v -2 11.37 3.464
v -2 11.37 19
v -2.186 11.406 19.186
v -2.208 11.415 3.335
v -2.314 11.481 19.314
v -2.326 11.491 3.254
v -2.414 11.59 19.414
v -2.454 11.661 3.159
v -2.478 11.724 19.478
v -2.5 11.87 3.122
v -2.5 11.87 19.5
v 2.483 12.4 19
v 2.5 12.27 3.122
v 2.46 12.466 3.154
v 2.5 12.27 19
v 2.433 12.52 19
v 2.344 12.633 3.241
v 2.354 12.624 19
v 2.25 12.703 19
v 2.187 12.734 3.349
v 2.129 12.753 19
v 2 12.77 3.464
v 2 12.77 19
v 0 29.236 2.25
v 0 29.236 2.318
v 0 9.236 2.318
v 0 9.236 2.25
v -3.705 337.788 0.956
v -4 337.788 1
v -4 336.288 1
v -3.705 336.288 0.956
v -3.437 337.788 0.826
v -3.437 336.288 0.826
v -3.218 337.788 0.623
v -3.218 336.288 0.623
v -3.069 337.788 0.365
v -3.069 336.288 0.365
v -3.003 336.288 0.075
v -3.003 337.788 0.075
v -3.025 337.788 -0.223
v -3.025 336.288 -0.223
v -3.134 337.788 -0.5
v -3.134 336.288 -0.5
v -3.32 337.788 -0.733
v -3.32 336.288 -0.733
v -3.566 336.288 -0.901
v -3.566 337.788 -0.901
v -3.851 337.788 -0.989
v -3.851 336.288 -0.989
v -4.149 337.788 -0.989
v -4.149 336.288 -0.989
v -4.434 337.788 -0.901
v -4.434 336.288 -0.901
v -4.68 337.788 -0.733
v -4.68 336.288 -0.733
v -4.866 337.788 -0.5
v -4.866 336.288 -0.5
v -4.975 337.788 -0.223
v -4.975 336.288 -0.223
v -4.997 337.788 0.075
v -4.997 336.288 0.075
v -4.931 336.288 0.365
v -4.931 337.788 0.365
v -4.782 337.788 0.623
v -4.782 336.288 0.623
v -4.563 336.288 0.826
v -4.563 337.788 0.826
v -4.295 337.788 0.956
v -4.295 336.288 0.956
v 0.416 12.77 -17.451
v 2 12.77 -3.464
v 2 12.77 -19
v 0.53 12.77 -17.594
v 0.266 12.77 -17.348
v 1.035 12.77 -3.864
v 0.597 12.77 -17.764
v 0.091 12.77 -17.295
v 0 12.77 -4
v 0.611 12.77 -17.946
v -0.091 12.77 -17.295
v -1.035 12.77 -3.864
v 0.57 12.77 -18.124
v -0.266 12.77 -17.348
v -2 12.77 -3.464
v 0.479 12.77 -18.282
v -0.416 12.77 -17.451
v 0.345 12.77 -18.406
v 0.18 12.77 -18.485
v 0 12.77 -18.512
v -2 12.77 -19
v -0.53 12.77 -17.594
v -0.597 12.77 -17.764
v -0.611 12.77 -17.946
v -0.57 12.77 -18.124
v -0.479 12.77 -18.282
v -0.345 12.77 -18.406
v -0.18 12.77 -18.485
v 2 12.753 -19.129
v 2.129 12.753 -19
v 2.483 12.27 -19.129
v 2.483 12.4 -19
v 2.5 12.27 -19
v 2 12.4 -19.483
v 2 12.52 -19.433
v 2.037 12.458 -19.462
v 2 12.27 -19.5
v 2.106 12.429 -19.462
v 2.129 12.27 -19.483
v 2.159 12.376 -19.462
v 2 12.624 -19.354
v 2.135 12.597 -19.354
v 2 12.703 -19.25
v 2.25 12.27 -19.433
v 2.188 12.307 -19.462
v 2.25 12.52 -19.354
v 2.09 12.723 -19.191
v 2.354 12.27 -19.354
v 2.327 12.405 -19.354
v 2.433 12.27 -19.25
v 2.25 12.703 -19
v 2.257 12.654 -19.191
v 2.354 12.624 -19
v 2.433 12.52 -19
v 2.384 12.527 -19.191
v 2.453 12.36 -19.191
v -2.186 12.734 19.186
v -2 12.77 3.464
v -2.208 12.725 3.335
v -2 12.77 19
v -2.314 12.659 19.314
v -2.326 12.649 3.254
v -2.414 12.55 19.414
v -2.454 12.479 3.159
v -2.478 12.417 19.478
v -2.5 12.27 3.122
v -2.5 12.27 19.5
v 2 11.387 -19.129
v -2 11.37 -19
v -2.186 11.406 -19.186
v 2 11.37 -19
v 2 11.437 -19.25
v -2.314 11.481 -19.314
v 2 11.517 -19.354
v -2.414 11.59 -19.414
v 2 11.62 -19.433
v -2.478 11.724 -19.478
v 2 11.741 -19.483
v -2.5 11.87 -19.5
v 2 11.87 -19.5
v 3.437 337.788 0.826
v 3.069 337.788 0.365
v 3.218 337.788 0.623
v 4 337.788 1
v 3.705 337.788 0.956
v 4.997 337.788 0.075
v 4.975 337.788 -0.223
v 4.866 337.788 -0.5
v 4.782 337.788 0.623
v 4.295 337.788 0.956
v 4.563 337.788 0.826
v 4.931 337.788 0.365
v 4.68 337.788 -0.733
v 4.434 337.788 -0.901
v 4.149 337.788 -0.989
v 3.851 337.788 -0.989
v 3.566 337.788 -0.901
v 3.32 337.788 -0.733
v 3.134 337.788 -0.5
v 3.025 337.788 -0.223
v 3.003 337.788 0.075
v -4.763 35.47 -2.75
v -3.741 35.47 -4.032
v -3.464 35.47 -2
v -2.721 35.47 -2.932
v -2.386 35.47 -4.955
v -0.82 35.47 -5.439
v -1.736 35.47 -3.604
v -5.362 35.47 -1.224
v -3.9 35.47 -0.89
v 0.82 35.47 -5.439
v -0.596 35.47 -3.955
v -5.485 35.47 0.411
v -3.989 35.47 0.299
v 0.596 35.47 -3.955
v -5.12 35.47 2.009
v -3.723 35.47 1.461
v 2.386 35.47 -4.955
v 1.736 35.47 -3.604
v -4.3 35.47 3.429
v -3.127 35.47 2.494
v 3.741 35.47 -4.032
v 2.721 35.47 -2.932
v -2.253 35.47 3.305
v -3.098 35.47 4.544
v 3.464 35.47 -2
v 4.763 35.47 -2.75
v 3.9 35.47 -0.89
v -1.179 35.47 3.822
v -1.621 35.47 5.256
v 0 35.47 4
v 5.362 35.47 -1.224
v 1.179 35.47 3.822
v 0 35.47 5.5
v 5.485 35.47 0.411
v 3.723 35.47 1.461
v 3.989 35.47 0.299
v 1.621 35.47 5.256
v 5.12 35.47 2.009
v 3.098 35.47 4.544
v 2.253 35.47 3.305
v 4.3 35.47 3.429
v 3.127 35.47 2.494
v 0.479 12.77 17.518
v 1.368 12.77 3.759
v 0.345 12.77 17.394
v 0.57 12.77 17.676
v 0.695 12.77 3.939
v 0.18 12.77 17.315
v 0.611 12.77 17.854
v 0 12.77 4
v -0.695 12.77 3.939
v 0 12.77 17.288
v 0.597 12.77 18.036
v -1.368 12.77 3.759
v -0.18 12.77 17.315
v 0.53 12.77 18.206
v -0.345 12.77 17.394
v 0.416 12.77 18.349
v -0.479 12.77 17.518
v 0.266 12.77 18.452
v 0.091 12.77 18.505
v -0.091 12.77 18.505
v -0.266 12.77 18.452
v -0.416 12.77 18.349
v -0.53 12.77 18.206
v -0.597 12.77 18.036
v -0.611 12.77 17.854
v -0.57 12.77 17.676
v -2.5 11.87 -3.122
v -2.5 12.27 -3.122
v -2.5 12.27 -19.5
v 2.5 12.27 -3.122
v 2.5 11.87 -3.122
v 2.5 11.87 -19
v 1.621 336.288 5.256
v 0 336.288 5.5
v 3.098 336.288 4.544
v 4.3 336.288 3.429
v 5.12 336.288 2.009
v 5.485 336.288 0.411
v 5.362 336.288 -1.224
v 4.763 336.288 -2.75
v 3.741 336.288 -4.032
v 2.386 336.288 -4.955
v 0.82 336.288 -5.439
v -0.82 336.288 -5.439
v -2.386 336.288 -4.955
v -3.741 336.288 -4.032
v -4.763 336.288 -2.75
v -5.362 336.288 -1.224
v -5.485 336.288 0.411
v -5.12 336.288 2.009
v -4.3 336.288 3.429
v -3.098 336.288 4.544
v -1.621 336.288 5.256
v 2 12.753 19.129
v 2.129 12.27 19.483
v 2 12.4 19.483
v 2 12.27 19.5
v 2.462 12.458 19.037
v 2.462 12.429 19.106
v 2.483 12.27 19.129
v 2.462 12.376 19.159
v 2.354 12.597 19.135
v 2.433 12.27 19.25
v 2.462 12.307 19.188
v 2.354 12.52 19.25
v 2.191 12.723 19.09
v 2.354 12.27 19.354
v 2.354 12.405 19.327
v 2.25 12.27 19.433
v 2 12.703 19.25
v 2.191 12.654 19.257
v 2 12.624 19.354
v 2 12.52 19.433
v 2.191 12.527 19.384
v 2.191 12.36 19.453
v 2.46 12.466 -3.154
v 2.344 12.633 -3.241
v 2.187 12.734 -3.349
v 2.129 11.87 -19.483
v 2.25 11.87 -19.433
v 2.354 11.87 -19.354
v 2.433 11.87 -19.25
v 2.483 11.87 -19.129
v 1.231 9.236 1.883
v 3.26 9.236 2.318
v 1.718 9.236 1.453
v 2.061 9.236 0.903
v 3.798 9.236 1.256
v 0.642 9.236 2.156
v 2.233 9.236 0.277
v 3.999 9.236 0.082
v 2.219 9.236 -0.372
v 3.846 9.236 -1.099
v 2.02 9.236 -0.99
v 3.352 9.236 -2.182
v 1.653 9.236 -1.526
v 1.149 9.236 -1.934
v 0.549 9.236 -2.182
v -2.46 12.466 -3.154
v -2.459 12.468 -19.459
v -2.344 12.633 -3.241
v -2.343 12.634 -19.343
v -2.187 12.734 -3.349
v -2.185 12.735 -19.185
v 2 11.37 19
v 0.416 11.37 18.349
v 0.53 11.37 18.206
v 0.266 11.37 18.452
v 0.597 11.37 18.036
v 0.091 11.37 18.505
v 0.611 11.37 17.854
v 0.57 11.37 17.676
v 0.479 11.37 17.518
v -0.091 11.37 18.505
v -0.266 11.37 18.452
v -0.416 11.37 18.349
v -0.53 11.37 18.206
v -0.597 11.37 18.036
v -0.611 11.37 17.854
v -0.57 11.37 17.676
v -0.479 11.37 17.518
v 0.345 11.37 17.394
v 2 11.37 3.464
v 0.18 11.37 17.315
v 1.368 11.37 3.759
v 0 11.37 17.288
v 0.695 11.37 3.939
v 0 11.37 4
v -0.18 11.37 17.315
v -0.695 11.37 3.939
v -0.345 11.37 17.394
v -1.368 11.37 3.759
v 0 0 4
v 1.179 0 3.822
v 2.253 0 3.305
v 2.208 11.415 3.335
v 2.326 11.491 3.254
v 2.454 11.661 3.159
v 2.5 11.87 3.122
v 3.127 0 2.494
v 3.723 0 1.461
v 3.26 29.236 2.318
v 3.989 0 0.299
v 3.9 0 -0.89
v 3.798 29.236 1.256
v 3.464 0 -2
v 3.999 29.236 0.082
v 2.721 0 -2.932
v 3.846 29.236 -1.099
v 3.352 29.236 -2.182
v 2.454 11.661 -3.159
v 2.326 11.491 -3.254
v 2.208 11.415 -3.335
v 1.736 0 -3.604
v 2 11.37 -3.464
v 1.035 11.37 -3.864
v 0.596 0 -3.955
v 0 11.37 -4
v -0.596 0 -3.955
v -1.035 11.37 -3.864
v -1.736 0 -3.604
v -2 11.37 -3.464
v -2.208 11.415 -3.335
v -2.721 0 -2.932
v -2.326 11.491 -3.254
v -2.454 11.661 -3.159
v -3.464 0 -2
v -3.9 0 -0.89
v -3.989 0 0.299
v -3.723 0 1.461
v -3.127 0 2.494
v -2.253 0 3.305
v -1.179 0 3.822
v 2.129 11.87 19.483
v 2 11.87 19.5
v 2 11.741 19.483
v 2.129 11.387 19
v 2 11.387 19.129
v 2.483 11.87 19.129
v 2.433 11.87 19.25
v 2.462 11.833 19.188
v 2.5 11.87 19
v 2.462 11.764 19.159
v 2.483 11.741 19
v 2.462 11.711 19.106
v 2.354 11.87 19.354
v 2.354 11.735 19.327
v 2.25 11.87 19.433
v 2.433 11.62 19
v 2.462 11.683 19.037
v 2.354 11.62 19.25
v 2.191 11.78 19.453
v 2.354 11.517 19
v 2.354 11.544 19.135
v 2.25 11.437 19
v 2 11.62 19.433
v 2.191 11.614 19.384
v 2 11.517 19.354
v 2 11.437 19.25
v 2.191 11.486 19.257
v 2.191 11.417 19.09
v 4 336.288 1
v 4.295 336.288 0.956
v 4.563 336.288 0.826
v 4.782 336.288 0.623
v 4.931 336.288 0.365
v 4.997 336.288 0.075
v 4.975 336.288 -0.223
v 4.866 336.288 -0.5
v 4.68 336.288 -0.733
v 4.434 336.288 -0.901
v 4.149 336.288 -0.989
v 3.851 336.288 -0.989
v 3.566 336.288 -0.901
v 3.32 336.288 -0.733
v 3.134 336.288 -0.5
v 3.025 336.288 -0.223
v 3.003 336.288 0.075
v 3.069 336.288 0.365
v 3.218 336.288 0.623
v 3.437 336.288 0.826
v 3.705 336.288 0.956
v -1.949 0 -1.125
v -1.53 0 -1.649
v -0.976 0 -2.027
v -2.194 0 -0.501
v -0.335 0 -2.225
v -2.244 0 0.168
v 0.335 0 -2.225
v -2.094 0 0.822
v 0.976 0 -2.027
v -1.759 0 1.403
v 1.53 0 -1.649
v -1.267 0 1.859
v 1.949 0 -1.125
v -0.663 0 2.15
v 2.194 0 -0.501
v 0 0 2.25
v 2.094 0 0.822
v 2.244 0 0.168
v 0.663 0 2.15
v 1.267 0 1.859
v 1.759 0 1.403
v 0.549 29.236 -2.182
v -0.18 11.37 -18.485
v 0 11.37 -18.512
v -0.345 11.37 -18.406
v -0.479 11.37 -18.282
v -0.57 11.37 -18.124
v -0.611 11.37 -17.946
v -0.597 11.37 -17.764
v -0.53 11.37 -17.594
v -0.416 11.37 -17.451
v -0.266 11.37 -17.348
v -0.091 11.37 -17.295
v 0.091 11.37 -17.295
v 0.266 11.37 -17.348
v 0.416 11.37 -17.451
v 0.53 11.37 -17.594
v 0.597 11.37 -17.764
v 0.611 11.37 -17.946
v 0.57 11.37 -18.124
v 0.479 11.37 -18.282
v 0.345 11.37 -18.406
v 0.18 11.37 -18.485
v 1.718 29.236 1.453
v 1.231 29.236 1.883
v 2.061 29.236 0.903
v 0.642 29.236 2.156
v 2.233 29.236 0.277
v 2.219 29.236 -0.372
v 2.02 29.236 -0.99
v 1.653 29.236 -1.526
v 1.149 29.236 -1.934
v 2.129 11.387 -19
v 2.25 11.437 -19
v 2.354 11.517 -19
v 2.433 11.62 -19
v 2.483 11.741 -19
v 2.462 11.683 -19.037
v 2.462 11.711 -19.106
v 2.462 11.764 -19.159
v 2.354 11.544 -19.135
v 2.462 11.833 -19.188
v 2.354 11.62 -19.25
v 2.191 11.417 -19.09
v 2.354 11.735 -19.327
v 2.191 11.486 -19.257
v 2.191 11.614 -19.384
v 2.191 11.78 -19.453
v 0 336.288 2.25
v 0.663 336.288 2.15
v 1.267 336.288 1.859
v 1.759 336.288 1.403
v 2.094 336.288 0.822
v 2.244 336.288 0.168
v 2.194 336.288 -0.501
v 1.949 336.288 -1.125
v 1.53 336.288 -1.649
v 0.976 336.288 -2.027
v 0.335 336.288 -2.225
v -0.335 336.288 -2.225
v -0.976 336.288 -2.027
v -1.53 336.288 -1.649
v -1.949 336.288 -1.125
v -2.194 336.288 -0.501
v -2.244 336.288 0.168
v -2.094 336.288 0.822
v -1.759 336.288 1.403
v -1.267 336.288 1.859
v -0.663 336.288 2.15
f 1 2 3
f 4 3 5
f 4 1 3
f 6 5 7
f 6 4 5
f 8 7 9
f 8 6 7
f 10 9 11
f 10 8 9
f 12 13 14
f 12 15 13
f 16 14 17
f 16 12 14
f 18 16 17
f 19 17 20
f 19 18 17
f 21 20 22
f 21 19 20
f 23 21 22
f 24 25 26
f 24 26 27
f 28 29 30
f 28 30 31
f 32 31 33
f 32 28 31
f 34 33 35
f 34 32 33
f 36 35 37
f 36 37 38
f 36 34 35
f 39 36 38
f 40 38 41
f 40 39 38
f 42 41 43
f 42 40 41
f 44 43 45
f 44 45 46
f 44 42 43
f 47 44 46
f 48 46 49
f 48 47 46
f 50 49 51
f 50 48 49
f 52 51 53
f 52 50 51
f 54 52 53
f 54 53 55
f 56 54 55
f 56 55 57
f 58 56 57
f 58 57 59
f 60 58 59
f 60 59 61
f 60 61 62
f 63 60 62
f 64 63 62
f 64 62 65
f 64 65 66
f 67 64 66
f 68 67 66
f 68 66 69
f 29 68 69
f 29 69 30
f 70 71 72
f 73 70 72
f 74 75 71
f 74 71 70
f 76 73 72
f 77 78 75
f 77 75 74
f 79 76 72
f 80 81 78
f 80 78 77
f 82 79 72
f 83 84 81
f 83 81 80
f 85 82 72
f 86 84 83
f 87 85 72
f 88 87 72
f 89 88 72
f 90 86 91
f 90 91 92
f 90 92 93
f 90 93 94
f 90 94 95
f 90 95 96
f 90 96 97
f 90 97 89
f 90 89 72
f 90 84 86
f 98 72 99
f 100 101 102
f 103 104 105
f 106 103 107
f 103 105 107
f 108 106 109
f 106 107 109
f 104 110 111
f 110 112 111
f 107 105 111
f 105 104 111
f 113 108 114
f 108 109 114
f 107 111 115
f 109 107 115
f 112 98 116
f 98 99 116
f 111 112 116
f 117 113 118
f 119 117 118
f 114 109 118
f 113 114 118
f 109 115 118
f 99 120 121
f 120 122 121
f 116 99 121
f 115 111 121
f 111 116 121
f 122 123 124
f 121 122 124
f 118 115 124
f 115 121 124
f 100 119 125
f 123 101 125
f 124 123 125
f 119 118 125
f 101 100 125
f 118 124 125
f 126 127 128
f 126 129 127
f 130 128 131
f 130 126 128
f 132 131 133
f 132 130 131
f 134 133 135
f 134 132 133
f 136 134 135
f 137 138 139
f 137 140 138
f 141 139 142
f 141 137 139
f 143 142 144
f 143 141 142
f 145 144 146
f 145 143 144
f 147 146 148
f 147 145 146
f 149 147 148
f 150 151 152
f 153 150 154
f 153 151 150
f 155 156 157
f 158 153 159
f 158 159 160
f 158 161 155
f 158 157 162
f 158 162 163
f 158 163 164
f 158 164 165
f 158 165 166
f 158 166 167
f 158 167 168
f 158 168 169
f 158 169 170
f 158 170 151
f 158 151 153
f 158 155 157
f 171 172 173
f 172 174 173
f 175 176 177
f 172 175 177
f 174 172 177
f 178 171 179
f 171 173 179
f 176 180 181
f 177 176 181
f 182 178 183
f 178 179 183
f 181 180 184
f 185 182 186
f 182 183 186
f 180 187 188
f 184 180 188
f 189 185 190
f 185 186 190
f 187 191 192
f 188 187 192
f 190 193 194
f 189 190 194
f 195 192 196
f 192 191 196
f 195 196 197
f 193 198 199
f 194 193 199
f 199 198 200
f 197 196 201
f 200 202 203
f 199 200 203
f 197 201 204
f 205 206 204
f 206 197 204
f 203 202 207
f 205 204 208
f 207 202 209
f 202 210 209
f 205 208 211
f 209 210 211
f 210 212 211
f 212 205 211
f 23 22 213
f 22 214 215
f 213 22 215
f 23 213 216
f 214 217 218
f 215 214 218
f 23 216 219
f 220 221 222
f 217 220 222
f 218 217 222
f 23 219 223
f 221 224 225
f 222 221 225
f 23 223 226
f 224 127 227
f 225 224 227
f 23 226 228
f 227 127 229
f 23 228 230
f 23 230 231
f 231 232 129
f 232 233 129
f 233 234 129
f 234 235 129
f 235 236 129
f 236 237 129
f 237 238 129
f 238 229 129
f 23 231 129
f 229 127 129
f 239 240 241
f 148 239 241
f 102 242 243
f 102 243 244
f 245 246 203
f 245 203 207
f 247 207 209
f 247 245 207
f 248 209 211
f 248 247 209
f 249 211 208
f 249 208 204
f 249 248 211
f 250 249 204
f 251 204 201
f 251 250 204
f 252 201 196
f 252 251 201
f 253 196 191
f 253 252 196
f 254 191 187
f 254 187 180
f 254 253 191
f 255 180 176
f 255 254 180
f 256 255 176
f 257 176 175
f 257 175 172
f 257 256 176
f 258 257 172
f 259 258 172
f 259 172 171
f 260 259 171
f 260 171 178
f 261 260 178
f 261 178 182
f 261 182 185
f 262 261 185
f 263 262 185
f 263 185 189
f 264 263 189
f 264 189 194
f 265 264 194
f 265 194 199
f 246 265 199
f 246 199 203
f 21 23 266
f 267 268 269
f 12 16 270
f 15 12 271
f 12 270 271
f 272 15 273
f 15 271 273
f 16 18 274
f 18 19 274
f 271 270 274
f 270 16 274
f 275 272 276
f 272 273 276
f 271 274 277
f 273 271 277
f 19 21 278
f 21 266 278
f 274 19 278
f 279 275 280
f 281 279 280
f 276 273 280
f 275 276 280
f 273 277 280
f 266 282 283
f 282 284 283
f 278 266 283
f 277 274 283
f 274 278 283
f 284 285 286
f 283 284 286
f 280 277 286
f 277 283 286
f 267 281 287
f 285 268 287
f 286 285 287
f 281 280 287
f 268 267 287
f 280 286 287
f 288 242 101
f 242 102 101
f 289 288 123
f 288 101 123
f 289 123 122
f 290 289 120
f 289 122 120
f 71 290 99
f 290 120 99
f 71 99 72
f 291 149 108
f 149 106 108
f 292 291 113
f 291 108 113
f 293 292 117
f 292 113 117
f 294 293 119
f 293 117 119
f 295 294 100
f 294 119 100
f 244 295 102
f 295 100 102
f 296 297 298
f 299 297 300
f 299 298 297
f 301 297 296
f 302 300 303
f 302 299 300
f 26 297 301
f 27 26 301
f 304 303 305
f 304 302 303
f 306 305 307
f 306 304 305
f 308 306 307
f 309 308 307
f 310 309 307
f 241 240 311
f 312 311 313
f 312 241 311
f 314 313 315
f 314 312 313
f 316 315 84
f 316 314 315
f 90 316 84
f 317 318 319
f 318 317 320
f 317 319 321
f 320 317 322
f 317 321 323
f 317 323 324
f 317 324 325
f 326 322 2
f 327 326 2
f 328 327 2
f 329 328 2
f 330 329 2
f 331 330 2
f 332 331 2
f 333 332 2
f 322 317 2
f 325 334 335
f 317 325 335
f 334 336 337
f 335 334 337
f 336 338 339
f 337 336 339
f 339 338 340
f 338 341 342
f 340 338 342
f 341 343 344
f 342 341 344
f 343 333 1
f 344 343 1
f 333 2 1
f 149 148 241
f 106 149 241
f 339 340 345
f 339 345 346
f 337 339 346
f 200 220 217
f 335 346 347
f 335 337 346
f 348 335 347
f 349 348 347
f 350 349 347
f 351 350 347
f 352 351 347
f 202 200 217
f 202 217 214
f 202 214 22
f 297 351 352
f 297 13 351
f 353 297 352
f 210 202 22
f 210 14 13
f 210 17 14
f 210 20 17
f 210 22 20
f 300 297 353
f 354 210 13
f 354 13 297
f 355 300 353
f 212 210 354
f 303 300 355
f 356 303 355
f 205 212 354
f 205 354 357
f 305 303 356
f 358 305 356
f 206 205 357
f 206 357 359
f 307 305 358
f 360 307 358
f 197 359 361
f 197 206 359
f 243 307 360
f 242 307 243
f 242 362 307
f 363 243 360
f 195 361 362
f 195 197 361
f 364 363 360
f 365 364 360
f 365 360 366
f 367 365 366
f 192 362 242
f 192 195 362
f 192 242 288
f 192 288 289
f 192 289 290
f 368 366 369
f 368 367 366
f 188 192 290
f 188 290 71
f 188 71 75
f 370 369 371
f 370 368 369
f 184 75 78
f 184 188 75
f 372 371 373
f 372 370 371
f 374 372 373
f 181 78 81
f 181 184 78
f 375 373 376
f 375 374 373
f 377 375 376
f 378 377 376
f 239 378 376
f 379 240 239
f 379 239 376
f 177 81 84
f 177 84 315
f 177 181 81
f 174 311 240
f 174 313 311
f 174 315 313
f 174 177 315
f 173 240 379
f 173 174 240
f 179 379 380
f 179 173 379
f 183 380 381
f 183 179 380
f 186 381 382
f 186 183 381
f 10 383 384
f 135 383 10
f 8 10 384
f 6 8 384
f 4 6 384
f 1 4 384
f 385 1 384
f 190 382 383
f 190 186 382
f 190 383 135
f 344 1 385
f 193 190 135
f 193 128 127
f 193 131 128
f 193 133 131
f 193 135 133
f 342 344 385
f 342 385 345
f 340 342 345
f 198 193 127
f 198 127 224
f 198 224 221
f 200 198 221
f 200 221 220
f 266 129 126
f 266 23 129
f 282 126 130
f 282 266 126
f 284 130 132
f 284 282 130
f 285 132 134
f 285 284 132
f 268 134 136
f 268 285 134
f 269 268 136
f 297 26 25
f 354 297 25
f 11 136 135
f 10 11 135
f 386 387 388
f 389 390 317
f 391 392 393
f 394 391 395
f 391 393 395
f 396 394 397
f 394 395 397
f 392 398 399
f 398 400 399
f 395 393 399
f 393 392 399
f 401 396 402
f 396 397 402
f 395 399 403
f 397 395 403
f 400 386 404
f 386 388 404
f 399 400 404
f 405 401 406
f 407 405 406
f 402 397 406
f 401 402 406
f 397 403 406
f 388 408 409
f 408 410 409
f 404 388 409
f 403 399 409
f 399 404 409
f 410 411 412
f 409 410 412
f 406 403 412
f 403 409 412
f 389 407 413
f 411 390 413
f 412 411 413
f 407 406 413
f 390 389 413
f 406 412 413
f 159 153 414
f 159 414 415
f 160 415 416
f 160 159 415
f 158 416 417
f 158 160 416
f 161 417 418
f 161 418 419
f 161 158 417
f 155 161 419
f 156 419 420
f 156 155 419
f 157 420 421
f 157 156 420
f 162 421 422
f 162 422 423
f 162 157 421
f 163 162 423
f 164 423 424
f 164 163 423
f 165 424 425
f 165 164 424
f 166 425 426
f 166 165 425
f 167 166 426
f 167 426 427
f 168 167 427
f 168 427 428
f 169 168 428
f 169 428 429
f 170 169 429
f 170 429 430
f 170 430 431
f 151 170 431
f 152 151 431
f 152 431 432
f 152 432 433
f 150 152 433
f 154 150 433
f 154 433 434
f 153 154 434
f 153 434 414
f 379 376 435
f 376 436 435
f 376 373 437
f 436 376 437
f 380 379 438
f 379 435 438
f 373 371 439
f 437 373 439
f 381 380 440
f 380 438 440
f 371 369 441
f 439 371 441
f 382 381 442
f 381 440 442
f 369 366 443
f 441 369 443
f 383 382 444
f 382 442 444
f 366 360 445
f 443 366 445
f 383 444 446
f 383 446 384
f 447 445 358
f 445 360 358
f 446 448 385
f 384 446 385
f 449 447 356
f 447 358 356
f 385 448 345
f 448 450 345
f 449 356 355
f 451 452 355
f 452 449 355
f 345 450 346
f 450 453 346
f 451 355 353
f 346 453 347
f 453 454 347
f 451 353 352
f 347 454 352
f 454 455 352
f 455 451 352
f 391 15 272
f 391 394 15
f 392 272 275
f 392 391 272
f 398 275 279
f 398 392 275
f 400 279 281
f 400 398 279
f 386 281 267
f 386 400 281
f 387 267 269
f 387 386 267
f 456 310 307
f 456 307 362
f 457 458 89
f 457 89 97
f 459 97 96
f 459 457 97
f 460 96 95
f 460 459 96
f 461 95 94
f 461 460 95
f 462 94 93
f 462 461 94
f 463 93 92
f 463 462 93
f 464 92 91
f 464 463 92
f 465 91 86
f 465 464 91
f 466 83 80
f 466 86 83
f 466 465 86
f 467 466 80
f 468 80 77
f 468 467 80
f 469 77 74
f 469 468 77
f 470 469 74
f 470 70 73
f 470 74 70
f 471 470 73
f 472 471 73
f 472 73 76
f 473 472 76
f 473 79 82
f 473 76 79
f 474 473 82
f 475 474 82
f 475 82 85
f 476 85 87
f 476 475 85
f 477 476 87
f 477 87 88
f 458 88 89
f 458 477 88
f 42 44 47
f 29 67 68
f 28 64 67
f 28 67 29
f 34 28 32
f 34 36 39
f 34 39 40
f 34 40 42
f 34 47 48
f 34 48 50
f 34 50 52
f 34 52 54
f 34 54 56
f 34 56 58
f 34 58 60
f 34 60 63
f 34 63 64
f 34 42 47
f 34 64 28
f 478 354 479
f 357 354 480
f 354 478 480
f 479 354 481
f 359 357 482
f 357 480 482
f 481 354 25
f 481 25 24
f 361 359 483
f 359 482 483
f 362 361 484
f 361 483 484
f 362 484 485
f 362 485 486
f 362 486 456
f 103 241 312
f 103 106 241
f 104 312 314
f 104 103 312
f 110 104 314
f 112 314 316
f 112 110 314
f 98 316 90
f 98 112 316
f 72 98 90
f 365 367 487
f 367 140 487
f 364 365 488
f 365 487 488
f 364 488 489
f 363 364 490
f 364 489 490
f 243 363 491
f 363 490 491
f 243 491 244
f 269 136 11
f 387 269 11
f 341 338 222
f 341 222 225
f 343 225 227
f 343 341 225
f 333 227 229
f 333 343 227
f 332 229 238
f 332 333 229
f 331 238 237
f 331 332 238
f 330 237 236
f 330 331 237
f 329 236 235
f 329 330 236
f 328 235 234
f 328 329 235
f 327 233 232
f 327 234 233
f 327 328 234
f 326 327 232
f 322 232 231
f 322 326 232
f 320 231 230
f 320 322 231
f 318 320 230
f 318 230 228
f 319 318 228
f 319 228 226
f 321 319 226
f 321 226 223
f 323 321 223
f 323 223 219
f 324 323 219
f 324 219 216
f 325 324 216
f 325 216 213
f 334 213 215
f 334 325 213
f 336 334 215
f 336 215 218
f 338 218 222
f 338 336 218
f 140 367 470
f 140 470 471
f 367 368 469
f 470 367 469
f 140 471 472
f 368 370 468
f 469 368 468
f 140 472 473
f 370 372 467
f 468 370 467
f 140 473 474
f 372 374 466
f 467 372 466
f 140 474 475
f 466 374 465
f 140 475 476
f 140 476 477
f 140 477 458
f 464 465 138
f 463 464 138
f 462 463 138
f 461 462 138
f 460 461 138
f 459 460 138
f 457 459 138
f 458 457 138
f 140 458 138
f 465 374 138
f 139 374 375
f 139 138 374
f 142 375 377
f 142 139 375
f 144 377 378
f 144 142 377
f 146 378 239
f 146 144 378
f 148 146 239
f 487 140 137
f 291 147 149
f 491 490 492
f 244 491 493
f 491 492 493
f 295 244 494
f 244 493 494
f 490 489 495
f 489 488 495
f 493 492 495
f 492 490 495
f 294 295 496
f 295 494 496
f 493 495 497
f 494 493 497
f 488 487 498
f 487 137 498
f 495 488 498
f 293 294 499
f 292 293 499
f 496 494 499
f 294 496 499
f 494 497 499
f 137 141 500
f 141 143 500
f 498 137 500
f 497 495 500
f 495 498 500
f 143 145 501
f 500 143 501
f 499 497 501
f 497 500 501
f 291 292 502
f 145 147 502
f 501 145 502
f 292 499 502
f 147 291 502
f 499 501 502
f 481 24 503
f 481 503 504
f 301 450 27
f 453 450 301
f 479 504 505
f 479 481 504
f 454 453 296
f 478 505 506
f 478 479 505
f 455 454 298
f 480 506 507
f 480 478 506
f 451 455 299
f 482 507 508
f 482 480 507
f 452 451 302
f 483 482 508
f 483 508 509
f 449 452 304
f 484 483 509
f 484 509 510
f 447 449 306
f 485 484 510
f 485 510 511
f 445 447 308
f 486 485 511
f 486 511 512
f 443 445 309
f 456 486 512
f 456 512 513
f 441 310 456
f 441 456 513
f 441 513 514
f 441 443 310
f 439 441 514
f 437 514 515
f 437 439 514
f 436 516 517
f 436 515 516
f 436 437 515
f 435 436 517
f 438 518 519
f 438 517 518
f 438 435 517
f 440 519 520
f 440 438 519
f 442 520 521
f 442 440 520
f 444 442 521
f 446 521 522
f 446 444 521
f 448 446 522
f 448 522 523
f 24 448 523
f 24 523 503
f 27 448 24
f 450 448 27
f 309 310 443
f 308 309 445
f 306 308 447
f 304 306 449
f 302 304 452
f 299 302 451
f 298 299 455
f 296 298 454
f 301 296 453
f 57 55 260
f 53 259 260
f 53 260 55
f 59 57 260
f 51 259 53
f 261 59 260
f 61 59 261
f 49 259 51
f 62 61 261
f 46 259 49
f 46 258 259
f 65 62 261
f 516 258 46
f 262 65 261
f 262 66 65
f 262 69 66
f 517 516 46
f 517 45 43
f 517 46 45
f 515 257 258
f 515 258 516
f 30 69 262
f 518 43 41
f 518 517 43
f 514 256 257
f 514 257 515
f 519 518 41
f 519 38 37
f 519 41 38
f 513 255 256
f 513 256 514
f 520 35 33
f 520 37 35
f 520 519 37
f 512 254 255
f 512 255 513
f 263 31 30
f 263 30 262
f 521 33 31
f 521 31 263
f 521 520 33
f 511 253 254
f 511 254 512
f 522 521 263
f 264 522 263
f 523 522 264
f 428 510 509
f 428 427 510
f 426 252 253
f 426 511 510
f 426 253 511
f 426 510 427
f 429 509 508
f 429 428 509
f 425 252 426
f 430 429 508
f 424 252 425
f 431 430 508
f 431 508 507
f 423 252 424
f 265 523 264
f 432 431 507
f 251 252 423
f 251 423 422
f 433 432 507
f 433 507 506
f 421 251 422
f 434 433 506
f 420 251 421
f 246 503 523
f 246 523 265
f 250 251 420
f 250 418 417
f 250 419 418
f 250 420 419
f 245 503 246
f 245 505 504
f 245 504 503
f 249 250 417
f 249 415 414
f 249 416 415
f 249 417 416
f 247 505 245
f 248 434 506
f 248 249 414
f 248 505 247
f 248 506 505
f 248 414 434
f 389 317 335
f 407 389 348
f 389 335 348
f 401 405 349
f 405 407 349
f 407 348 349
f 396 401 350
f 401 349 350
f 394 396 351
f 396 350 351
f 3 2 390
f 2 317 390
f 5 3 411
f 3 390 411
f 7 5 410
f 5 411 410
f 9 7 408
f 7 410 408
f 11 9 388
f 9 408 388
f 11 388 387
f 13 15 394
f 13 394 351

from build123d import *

# Parameters (mm, degrees)
SWEEP3_PROFILE_R         = 4
SWEEP4_PROFILE_R         = 5.5
SKETCH45_R               = 2.25
CUT_EXTRUDE2_DEPTH       = 337.377466094
SWEEP5_PROFILE_R         = 1
SWEEP6_PROFILE_R         = 1
SKETCH72_W               = 4.5
SKETCH72_H               = 20
CUT_EXTRUDE6_DEPTH       = 20
BOSS_EXTRUDE1_DEPTH      = 2.5
BOSS_EXTRUDE1_DEPTH_BACK = 2.5
BOSS_EXTRUDE3_DEPTH      = 2.5
BOSS_EXTRUDE3_DEPTH_BACK = 2.5
SKETCH76_4_W             = 16.5
SKETCH76_4_H             = 1.4
SKETCH77_R               = 0.612238256
CUT_EXTRUDE7_DEPTH       = 20
FILLET1_R                = 0.5


with BuildPart() as part:
    # Sweep3: sweep along a path in Sketch31
    with BuildLine(Plane.XY) as sweep3_path:
        Line((0, 0), (0, 35.470165431))
    # Sweep3 profile (on start of the path) → Sweep3 (sweep)
    with BuildSketch(Plane.ZX):
        Circle(SWEEP3_PROFILE_R)
    sweep(path=sweep3_path.line)

    # Sweep4: sweep along a path in Sketch38
    with BuildLine(Plane.XY) as sweep4_path:
        Line((0, 35.470165431), (0, 336.287525335))
    # Sweep4 profile (on start of the path) → Sweep4 (sweep)
    with BuildSketch(Plane.ZX.offset(35.470165431)):
        Circle(SWEEP4_PROFILE_R)
    sweep(path=sweep4_path.line)

    # Sketch45 → Cut-Extrude2 (cut, through all)
    with BuildSketch(Plane(origin=(0, 0, 0), x_dir=(1, 0, 0), z_dir=(0, 1, 0))):
        Circle(SKETCH45_R)
    extrude(amount=CUT_EXTRUDE2_DEPTH, mode=Mode.SUBTRACT)

    # Sweep5: sweep along a curve in space
    with BuildLine() as sweep5_path:
        Line((4, 336.287525335, 5.558e-06), (4, 337.787525335, 5.558e-06))
    # Sweep5 profile (on start of the path) → Sweep5 (sweep)
    with BuildSketch(Plane(origin=(4, 336.287525335, 5.558e-06), x_dir=(0, 0, 1), z_dir=(0, 1, 0))):
        Circle(SWEEP5_PROFILE_R)
    sweep(path=sweep5_path.line)

    # Sweep6: sweep along a curve in space
    with BuildLine() as sweep6_path:
        Line((-4, 336.287525335, 9.31e-07), (-4, 337.787525335, 9.31e-07))
    # Sweep6 profile (on start of the path) → Sweep6 (sweep)
    with BuildSketch(Plane(origin=(-4, 336.287525335, 9.31e-07), x_dir=(0, 0, 1), z_dir=(0, 1, 0))):
        Circle(SWEEP6_PROFILE_R)
    sweep(path=sweep6_path.line)

    # Sketch72 → Cut-Extrude6 (cut)
    with BuildSketch(Plane(origin=(0, 0, 0), x_dir=(0, 0, -1), z_dir=(1, 0, 0))):
        with Locations((-0.068000409, 19.236124066)):
            Rectangle(SKETCH72_W, SKETCH72_H)
    extrude(amount=CUT_EXTRUDE6_DEPTH, mode=Mode.SUBTRACT)

    # Sketch76 → Boss-Extrude1 (add, two sides: drawn at the far end of the back side and taken through both)
    with BuildSketch(Plane(origin=(0, 0, 0), x_dir=(0, 0, -1), z_dir=(1, 0, 0)).offset(-BOSS_EXTRUDE1_DEPTH_BACK)):
        Polygon((-3, 12.070165431), (-3, 12.770165431), (-19.5, 12.770165431), (-19.5, 12.370165431), (-19.5, 11.370165431), (-3, 11.370165431), align=None)
    extrude(amount=BOSS_EXTRUDE1_DEPTH + BOSS_EXTRUDE1_DEPTH_BACK)

    # Sketch76<4> → Boss-Extrude3 (add, two sides: drawn at the far end of the back side and taken through both)
    with BuildSketch(Plane(origin=(0, 0, 0), x_dir=(0, 0, -1), z_dir=(1, 0, 0)).offset(-BOSS_EXTRUDE3_DEPTH_BACK)):
        with Locations((11.25, 12.070165431)):
            Rectangle(SKETCH76_4_W, SKETCH76_4_H)
    extrude(amount=BOSS_EXTRUDE3_DEPTH + BOSS_EXTRUDE3_DEPTH_BACK)

    # Sketch77 → Cut-Extrude7 (cut)
    with BuildSketch(Plane(origin=(0, 0, 0), x_dir=(1, 0, 0), z_dir=(0, 1, 0))):
        with Locations((0, 17.9)):
            Circle(SKETCH77_R)
        with Locations((0, -17.9)):
            Circle(SKETCH77_R)
    extrude(amount=CUT_EXTRUDE7_DEPTH, mode=Mode.SUBTRACT)

    # Fillet1
    fillet1_edges = [part.edges().sort_by_distance(p)[0] for p in [
        (-2.5, 12.770165431, 11.3112495),
        (-2.5, 11.370165431, 11.3112495),
        (2.5, 12.070165431, 19.5),
        (0, 11.370165431, 19.5),
        (2.5, 11.370165431, 11.3112495),
        (2.5, 12.770165431, 11.3112495),
        (0, 12.770165431, 19.5),
        (-2.5, 11.370165431, -11.3112495),
        (-2.5, 12.770165431, -11.3112495),
        (0, 12.770165431, -19.5),
        (0, 11.370165431, -19.5),
        (2.5, 12.070165431, -19.5),
        (2.5, 11.370165431, -11.3112495),
        (2.5, 12.770165431, -11.3112495),
    ]]
    fillet(fillet1_edges, radius=FILLET1_R)


solid = part.part
